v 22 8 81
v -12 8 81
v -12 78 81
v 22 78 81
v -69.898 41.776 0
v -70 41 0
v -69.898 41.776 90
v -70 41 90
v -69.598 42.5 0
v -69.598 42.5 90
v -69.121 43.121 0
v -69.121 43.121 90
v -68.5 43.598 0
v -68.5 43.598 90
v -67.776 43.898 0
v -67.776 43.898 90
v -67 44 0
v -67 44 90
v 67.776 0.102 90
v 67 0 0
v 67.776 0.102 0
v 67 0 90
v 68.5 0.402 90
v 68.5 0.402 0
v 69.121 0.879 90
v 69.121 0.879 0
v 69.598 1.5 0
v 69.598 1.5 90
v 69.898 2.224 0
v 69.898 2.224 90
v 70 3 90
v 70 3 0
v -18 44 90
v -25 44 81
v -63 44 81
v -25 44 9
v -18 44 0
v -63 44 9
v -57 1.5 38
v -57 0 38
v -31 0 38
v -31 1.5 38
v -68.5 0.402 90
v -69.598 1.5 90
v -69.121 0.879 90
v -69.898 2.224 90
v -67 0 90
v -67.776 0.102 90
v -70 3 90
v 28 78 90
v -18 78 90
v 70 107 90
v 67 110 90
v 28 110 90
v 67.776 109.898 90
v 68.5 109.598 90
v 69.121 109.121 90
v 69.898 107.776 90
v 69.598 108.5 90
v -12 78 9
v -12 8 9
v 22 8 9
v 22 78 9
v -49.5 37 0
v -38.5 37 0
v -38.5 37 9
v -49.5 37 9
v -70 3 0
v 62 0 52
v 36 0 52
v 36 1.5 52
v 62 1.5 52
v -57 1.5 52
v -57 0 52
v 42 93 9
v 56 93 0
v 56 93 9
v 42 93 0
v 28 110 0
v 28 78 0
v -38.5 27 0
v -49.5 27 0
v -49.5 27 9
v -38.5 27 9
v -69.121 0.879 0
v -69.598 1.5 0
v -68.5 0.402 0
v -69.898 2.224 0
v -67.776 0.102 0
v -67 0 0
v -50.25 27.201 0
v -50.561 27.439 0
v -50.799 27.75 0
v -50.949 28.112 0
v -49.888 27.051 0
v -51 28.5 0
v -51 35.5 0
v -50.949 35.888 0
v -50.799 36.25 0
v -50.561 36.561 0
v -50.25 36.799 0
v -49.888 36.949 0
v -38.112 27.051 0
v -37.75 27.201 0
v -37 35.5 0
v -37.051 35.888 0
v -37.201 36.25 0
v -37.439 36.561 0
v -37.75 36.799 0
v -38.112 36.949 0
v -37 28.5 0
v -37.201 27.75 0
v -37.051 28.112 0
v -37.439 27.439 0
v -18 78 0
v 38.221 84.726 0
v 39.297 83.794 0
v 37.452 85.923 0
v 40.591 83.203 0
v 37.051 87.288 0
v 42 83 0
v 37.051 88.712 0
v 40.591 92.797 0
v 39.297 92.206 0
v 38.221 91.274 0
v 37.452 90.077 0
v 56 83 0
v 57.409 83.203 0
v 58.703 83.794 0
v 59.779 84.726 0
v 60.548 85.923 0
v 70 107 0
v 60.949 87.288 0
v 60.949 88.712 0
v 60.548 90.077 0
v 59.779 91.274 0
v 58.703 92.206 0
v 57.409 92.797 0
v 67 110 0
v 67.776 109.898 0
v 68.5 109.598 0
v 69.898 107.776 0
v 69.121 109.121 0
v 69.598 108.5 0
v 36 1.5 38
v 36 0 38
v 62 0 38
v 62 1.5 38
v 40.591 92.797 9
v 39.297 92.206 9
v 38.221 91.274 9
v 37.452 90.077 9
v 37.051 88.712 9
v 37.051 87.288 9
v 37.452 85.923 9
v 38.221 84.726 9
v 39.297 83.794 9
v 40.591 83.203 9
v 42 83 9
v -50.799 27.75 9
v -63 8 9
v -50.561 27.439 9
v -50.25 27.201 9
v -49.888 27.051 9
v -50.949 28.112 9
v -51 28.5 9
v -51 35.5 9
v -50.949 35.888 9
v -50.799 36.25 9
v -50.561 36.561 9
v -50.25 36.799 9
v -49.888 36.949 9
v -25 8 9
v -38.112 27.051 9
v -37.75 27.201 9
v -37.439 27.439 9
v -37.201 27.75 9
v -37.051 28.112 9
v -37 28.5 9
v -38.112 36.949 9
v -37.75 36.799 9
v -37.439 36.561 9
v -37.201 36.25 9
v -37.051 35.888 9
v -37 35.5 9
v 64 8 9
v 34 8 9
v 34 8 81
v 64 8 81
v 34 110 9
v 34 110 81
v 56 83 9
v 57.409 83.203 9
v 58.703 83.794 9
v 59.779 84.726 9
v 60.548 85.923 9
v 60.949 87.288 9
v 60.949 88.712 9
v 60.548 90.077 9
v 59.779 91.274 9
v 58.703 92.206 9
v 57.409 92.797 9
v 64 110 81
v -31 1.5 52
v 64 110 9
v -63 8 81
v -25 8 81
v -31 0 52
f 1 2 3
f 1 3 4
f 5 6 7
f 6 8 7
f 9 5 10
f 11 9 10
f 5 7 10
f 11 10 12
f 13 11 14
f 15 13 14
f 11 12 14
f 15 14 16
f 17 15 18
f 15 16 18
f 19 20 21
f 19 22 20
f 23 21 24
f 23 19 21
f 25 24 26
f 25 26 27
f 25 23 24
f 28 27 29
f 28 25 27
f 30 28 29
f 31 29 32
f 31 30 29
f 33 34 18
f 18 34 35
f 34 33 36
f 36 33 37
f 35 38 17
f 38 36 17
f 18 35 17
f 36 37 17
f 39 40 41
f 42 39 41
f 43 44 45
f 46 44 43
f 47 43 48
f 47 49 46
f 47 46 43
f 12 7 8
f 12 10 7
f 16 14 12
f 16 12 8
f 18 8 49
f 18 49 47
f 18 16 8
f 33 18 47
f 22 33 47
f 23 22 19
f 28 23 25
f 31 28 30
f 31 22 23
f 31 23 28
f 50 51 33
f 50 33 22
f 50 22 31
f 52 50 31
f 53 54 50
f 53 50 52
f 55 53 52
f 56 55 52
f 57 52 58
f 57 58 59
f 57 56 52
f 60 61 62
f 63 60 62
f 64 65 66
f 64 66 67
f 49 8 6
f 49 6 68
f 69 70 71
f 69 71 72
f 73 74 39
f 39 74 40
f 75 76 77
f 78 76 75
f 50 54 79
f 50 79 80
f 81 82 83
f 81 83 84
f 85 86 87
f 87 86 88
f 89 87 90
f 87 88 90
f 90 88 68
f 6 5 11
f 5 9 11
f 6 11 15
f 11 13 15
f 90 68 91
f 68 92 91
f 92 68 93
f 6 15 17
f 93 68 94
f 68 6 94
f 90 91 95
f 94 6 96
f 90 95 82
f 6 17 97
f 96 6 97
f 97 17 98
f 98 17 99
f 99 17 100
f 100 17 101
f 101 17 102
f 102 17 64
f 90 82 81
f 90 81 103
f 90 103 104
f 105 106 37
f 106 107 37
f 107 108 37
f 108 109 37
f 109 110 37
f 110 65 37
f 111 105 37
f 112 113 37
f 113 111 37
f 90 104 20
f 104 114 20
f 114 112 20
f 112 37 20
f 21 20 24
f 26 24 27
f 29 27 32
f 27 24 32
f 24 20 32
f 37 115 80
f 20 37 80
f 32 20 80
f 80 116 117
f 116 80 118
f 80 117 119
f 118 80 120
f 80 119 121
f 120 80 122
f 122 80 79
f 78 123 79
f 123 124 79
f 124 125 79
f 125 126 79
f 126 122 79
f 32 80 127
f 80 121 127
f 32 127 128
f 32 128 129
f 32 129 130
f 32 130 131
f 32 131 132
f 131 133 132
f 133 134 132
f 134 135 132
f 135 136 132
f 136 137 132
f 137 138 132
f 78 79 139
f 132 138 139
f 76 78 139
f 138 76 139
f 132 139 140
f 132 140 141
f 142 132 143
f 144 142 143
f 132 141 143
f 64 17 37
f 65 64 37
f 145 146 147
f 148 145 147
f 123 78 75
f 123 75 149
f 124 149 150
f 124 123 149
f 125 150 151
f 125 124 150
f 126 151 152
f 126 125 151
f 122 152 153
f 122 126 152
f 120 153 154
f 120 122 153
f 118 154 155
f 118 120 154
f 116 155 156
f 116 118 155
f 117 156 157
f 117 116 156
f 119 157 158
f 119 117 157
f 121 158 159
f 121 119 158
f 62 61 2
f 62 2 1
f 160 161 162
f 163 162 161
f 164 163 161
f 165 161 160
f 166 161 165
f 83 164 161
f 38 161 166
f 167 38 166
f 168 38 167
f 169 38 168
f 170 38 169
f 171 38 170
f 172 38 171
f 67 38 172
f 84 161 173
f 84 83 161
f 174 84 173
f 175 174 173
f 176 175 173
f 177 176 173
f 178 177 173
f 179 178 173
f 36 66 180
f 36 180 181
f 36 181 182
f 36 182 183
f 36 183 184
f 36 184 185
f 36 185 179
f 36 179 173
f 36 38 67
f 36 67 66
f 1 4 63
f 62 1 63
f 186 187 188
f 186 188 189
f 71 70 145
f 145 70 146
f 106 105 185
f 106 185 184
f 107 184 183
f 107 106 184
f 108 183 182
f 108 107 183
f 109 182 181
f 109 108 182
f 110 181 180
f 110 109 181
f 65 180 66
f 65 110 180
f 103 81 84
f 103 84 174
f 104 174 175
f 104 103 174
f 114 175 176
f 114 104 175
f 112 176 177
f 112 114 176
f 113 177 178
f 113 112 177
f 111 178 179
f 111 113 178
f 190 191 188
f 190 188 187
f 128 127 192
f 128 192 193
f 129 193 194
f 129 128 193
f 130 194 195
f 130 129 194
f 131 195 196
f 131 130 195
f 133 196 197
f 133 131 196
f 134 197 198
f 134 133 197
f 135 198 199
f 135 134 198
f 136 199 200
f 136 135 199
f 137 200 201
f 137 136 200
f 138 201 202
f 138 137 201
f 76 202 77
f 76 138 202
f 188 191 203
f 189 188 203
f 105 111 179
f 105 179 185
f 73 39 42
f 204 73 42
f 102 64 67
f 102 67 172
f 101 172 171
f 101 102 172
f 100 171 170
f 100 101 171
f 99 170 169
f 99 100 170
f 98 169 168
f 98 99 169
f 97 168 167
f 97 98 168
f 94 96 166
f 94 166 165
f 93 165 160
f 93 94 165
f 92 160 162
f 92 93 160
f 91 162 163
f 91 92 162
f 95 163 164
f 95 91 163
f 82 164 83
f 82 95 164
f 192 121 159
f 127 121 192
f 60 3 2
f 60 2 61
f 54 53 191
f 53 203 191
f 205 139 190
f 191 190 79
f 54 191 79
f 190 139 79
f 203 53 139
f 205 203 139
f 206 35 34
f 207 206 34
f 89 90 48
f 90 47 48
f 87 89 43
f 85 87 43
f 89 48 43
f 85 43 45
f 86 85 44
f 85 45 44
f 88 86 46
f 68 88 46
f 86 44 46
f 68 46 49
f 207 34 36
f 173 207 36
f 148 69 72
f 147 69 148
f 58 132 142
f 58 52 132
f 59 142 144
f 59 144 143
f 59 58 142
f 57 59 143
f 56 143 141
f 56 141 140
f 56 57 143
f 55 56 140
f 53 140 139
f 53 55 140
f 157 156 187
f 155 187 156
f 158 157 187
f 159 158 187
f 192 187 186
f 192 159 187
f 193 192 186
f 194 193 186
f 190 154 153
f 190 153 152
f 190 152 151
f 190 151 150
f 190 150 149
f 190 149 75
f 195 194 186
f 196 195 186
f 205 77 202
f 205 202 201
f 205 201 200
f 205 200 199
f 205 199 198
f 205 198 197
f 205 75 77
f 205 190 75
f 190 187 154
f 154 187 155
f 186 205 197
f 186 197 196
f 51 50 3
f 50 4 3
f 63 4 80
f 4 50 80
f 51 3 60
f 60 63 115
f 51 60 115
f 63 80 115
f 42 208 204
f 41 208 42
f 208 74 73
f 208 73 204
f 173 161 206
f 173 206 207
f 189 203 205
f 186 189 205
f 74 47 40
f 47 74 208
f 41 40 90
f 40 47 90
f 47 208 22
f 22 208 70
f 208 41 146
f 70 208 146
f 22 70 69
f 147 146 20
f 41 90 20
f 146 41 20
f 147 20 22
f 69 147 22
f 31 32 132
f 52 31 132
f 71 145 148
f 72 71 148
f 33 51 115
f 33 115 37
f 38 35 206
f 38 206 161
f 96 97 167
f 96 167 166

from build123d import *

# Parameters (mm, degrees)
EXTRUDE_1_DEPTH      = 90
SKETCH_2_W           = 38
SKETCH_2_H           = 72
CUT_EXTRUDE_1_DEPTH  = 36
SKETCH_4_W           = 34
SKETCH_4_H           = 72
CUT_EXTRUDE_3_DEPTH  = 70
SKETCH_5_W           = 30
SKETCH_5_H           = 72
CUT_EXTRUDE_4_DEPTH  = 102
SKETCH_7_W           = 26
SKETCH_7_H           = 14
CUT_EXTRUDE_6_DEPTH  = 1.5
FILLET_2_R           = 3
CUT_EXTRUDE_11_DEPTH = 9.5
CUT_EXTRUDE_12_DEPTH = 9.5


with BuildPart() as part:
    # 草图1 → 凸台-拉伸1 (new body)
    with BuildSketch(Plane.XY):
        Polygon((-70, 0), (70, 0), (70, 110), (28, 110), (28, 78), (-18, 78), (-18, 44), (-70, 44), align=None)
    extrude(amount=EXTRUDE_1_DEPTH)

    # 草图2 → 切除-拉伸1 (cut)
    with BuildSketch(Plane(origin=(0, 44, 0), x_dir=(1, 0, 0), z_dir=(0, 1, 0))):
        with Locations((-44, -45)):
            Rectangle(SKETCH_2_W, SKETCH_2_H)
    extrude(amount=-CUT_EXTRUDE_1_DEPTH, mode=Mode.SUBTRACT)

    # 草图4 → 切除-拉伸3 (cut)
    with BuildSketch(Plane(origin=(0, 78, 0), x_dir=(1, 0, 0), z_dir=(0, 1, 0))):
        with Locations((5, -45)):
            Rectangle(SKETCH_4_W, SKETCH_4_H)
    extrude(amount=-CUT_EXTRUDE_3_DEPTH, mode=Mode.SUBTRACT)

    # 草图5 → 切除-拉伸4 (cut)
    with BuildSketch(Plane(origin=(0, 110, 0), x_dir=(1, 0, 0), z_dir=(0, 1, 0))):
        with Locations((49, -45)):
            Rectangle(SKETCH_5_W, SKETCH_5_H)
    extrude(amount=-CUT_EXTRUDE_4_DEPTH, mode=Mode.SUBTRACT)

    # 草图7 → 切除-拉伸6 (cut)
    with BuildSketch(Plane(origin=(0, 0, 0), x_dir=(1, 0, 0), z_dir=(0, 1, 0))):
        with Locations((-44, -45)):
            Rectangle(SKETCH_7_W, SKETCH_7_H)
        with Locations((49, -45)):
            Rectangle(SKETCH_7_W, SKETCH_7_H)
    extrude(amount=CUT_EXTRUDE_6_DEPTH, mode=Mode.SUBTRACT)

    # 圆角2
    fillet_2_edges = [part.edges().sort_by_distance(p)[0] for p in [
        (-70, 44, 45),
        (70, 110, 45),
        (70, 0, 45),
        (-70, 0, 45),
    ]]
    fillet(fillet_2_edges, radius=FILLET_2_R)

    # 草图12 → 切除-拉伸11 (cut)
    with BuildSketch(Plane.XY):
        with BuildLine():
            Line((-49.5, 27), (-38.5, 27))
            ThreePointArc((-38.5, 27), (-37.439339828, 27.439339828), (-37, 28.5))
            Line((-37, 28.5), (-37, 35.5))
            ThreePointArc((-37, 35.5), (-37.439339828, 36.560660172), (-38.5, 37))
            Line((-38.5, 37), (-49.5, 37))
            ThreePointArc((-49.5, 37), (-50.560660172, 36.560660172), (-51, 35.5))
            Line((-51, 35.5), (-51, 28.5))
            ThreePointArc((-51, 28.5), (-50.560660172, 27.439339828), (-49.5, 27))
        make_face()
    extrude(amount=CUT_EXTRUDE_11_DEPTH, mode=Mode.SUBTRACT)

    # 草图13 → 切除-拉伸12 (cut)
    with BuildSketch(Plane.XY):
        with BuildLine():
            Line((42, 83), (56, 83))
            ThreePointArc((56, 83), (61, 88), (56, 93))
            Line((56, 93), (42, 93))
            ThreePointArc((42, 93), (37, 88), (42, 83))
        make_face()
    extrude(amount=CUT_EXTRUDE_12_DEPTH, mode=Mode.SUBTRACT)


solid = part.part
